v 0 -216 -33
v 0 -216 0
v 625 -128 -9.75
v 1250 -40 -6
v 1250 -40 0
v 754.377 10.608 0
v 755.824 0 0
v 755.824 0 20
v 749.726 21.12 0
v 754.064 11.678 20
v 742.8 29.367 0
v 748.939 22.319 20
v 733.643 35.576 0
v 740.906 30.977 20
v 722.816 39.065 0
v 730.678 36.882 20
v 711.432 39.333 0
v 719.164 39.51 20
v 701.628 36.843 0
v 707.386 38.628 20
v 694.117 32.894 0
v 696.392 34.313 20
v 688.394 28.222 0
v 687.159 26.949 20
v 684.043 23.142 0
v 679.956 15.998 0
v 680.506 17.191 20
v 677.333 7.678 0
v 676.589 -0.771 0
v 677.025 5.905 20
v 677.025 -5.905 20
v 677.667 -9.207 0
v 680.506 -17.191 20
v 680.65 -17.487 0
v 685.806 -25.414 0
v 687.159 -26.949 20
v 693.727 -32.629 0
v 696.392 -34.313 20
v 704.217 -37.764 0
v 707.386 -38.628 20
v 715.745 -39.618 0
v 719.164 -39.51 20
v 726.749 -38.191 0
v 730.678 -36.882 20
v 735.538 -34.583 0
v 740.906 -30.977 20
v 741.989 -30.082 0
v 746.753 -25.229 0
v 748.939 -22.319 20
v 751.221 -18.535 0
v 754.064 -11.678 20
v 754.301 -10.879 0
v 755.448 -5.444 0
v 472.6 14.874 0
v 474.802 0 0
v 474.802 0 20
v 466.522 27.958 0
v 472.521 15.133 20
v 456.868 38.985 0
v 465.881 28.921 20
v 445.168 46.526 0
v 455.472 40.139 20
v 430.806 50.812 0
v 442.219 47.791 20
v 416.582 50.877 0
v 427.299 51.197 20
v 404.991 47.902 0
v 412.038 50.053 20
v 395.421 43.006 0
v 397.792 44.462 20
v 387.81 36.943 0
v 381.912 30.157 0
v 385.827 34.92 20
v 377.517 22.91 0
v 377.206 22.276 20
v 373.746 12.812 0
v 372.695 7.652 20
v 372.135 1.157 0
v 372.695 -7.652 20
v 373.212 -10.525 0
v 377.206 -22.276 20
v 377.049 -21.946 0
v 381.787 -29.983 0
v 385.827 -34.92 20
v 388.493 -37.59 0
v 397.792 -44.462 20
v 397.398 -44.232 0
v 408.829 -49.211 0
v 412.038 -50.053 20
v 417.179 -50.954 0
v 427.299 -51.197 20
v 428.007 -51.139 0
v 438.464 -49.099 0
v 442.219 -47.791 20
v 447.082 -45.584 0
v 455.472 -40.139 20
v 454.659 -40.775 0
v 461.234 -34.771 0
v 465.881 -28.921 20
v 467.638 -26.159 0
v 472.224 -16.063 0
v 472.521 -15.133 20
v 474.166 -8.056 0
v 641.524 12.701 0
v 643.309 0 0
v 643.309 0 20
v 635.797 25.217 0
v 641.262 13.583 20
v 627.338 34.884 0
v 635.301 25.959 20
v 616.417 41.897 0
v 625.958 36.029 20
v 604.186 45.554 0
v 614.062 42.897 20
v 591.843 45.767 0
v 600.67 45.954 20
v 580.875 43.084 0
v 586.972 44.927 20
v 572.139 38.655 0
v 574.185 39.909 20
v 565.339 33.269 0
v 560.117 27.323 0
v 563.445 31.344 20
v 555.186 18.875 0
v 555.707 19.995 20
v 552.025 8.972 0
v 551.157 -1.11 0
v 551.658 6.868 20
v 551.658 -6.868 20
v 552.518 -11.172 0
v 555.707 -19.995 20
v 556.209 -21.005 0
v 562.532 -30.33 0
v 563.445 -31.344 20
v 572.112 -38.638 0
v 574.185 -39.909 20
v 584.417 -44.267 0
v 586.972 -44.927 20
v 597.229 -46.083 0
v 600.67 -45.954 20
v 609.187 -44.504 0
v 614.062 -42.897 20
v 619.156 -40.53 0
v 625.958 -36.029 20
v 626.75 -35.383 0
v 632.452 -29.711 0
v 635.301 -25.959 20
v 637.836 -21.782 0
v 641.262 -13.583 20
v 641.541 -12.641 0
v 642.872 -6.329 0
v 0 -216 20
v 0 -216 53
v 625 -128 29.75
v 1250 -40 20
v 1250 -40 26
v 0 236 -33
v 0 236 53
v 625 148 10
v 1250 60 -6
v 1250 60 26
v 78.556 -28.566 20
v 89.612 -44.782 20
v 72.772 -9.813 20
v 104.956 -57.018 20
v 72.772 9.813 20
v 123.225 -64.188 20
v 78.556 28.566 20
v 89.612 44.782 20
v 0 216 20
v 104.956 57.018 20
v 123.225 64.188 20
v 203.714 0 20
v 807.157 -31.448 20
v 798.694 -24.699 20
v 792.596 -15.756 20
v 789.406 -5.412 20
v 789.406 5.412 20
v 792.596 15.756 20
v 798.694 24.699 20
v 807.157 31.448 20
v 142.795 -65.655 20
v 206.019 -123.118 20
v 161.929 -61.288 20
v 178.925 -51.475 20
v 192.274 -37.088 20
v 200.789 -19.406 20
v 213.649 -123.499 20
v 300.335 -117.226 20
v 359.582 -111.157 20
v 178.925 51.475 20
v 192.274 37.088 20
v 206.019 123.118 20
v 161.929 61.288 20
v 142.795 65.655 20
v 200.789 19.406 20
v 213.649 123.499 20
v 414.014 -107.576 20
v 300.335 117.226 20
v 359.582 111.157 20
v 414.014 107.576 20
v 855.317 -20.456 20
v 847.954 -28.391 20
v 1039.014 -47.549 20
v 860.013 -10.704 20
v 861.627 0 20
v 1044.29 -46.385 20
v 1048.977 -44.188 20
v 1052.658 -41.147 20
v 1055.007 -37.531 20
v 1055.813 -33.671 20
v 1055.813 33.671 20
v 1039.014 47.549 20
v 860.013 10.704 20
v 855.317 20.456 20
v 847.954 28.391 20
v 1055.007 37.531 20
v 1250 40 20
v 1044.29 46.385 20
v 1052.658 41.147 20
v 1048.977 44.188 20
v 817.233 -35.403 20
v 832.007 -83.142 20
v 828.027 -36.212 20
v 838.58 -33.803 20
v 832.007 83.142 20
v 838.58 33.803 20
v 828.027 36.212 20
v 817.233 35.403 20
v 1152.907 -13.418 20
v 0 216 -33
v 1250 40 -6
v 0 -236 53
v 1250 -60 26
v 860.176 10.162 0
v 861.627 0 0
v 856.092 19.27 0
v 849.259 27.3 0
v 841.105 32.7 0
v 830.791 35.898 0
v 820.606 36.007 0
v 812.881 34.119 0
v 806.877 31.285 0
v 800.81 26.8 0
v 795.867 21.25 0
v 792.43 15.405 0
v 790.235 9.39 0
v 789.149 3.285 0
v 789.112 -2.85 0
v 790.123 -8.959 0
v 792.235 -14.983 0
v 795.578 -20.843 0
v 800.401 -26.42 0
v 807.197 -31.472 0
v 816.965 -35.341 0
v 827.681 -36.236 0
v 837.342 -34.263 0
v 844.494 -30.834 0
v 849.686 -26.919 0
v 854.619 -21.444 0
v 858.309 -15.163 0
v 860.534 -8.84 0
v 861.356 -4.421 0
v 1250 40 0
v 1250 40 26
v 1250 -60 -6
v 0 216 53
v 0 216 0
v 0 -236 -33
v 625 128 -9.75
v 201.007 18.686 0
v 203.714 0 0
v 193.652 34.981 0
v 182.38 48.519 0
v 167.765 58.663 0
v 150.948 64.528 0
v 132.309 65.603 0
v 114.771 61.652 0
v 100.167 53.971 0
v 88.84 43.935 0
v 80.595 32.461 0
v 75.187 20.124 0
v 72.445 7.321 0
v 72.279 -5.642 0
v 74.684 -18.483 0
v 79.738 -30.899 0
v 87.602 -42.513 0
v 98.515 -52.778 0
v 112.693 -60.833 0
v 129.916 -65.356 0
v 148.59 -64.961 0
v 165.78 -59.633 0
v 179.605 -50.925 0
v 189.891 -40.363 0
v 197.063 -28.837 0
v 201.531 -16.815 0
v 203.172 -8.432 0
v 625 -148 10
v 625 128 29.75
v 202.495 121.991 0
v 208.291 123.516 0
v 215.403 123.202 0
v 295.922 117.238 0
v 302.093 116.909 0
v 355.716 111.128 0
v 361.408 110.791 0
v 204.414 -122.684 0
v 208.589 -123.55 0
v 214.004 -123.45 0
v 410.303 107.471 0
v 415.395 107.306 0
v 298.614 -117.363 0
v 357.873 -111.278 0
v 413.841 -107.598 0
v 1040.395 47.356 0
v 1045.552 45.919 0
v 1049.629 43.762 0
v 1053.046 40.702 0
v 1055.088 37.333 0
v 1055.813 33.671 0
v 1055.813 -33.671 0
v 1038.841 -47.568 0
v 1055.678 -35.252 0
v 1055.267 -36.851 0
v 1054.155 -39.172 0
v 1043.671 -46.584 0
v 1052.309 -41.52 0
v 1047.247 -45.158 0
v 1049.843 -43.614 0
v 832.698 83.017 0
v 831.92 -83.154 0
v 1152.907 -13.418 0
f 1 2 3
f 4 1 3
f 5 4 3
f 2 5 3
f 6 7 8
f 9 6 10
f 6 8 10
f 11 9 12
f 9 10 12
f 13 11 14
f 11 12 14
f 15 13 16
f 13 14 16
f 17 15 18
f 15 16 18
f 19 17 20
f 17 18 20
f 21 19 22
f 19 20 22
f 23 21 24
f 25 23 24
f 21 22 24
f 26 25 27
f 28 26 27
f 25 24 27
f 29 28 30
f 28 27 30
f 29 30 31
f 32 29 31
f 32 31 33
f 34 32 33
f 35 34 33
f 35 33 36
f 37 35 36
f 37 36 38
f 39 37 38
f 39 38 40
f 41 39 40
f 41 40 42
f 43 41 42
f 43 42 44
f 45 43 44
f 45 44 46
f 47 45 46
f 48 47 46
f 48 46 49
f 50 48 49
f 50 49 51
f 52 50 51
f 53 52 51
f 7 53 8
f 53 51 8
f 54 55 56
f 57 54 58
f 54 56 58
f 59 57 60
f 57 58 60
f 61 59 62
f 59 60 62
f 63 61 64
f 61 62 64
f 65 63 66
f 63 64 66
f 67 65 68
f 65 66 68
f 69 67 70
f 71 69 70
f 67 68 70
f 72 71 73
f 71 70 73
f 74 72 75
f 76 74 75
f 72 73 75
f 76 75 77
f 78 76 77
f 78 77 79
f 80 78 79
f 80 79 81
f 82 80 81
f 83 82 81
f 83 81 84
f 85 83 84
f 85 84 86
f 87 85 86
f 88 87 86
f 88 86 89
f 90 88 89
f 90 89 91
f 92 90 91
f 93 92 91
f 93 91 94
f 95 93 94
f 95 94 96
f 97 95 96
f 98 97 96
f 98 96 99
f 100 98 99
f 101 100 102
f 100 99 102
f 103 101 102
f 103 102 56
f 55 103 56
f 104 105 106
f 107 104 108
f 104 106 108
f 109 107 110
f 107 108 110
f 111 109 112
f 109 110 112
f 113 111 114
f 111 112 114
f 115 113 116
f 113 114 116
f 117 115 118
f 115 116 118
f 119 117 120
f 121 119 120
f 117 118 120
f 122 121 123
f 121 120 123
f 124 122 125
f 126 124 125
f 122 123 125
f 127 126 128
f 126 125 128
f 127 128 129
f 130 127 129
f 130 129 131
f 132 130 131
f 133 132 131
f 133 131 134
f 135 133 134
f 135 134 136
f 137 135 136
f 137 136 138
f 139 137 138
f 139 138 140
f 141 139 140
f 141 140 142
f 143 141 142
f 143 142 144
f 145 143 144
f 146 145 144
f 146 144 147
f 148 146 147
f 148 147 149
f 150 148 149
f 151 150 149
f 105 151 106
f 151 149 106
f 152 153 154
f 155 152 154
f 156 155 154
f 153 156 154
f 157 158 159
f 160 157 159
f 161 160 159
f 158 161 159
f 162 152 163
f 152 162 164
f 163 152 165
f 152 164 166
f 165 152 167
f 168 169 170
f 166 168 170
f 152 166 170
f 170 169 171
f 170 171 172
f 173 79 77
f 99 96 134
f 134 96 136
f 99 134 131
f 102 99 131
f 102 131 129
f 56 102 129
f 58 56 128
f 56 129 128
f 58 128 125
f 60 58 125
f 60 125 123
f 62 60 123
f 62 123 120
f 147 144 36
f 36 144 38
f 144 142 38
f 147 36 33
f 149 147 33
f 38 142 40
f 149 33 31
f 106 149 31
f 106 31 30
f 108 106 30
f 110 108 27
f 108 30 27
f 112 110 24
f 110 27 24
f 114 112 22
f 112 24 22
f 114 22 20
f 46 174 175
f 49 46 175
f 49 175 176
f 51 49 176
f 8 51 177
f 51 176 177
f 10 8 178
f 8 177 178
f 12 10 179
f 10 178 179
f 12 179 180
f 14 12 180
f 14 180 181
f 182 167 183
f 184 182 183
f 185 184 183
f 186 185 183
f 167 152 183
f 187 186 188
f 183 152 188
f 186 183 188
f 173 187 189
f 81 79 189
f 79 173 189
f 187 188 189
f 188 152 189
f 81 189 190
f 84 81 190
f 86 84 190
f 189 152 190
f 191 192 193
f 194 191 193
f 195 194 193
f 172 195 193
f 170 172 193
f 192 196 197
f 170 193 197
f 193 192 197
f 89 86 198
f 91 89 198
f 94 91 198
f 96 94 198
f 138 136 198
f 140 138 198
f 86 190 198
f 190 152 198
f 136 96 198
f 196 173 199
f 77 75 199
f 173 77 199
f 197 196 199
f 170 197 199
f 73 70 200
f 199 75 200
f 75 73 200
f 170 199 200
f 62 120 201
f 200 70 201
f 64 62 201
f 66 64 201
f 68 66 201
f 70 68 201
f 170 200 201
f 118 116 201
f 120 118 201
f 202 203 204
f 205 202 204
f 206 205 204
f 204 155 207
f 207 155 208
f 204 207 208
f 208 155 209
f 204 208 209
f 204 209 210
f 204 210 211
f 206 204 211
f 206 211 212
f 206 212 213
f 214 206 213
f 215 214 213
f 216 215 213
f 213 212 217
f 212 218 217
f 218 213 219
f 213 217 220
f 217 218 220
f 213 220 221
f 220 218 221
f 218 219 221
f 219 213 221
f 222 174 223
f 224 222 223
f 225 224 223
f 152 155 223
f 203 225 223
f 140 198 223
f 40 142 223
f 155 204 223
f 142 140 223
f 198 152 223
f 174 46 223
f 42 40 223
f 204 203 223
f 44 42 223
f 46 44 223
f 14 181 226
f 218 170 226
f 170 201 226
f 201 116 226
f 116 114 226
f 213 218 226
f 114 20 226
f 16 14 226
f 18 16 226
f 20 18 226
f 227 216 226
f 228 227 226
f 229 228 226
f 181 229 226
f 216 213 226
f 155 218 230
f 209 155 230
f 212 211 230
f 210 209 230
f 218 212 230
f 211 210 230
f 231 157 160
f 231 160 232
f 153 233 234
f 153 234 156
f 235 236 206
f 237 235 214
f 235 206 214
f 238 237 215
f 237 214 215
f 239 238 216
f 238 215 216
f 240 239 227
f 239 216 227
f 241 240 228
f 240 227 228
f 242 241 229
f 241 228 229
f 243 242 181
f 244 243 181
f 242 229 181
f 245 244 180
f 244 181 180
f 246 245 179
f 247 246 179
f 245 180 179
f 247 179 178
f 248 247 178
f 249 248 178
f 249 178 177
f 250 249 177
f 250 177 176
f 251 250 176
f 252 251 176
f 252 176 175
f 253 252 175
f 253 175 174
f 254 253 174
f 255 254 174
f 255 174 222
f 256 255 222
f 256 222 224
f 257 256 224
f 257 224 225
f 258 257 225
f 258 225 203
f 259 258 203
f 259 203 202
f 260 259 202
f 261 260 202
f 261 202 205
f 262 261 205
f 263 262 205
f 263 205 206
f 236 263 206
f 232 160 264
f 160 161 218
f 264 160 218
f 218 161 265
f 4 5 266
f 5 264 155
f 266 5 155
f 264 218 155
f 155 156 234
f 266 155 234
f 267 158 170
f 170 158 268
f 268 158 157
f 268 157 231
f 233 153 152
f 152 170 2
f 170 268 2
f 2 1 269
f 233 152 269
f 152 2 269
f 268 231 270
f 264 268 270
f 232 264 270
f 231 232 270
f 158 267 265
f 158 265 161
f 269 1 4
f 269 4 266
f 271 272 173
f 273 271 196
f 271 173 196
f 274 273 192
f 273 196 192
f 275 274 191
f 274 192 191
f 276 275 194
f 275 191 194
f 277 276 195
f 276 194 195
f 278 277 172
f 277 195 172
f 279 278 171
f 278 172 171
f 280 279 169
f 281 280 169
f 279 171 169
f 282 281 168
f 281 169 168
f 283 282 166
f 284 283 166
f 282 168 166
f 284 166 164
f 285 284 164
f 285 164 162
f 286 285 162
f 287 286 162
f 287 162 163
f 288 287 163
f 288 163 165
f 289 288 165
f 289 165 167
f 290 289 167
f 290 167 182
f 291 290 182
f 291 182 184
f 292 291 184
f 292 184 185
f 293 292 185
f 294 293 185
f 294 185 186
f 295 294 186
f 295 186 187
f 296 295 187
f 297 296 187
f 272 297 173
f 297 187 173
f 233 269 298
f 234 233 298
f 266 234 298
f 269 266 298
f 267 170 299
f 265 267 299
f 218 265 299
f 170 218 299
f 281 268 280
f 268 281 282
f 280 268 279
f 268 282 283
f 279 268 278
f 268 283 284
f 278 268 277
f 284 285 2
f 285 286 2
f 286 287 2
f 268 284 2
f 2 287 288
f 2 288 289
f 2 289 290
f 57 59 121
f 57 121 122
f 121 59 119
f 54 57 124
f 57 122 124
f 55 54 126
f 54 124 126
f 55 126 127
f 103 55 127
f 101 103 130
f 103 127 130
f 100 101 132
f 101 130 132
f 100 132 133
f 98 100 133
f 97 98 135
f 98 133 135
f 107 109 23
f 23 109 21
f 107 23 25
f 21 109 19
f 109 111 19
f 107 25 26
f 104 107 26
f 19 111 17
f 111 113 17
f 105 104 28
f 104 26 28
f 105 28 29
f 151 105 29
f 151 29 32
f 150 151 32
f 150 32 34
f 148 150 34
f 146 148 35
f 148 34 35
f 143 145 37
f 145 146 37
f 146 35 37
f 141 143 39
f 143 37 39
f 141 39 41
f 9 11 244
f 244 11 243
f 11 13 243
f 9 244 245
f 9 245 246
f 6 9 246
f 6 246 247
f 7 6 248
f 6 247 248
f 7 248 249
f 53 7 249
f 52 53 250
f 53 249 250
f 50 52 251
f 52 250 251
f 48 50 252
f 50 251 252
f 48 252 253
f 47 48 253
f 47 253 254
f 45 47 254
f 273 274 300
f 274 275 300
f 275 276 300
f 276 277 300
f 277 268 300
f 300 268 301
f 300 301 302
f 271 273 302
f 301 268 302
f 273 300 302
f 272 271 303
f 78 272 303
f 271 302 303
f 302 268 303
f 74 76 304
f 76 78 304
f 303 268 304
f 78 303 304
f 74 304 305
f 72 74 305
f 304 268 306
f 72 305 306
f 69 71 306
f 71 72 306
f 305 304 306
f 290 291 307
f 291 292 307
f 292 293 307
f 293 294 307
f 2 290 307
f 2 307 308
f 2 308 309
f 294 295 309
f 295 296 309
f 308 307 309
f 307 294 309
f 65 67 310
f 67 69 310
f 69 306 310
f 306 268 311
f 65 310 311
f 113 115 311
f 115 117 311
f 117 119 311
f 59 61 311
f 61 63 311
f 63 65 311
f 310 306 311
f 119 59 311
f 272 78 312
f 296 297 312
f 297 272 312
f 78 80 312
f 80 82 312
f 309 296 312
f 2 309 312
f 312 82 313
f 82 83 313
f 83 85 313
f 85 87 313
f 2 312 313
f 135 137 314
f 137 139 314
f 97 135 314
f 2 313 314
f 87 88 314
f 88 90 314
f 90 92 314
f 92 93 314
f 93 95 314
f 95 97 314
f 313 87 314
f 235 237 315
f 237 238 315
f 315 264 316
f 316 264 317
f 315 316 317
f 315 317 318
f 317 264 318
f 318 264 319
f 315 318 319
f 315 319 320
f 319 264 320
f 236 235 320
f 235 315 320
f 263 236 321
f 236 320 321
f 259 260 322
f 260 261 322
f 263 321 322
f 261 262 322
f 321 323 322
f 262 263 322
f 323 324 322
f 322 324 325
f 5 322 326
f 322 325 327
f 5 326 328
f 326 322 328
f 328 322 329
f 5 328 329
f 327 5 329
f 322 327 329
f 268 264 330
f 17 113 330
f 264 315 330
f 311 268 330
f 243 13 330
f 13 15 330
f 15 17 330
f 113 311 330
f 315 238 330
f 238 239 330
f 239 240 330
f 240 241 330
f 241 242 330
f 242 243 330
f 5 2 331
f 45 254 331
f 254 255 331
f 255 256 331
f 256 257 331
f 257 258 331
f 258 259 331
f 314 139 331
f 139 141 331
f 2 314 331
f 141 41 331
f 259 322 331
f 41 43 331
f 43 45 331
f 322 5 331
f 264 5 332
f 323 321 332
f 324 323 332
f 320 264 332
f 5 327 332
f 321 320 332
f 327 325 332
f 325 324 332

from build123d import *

# Parameters (mm, degrees)
SKETCH5_R          = 65.838775907
SKETCH5_R_2        = 51.340137945
SKETCH5_R_3        = 46.082776278
SKETCH5_R_4        = 36.313221665
SKETCH5_R_5        = 39.620905692
CUT_EXTRUDE1_DEPTH = 54.0000001


with BuildPart() as part:
    # Sketch1 → Loft l4 section 0
    with BuildSketch(Plane(origin=(0, 0, 0), x_dir=(0, 0, -1), z_dir=(1, 0, 0))):
        Polygon((-53, 236), (33, 236), (33, 216), (0, 216), (0, -216), (33, -216), (33, -236), (-53, -236), (-53, -216), (-20, -216), (-20, 216), (-53, 216), align=None)
    # Sketch4 → Loft l4 section 1
    with BuildSketch(Plane(origin=(1250, 0, -1000), x_dir=(0, 0, 1), z_dir=(-1, 0, 0))):
        Polygon((994, 60), (1026, 60), (1026, 40), (1020, 40), (1020, -40), (1026, -40), (1026, -60), (994, -60), (994, -40), (1000, -40), (1000, 40), (994, 40), align=None)
    loft()

    # Sketch5 → Cut-Extrude1 (cut, through all)
    with BuildSketch(Plane.XY.offset(20)):
        with Locations((137.875176339, 0)):
            Circle(SKETCH5_R)
        with Locations((423.461863642, 0)):
            Circle(SKETCH5_R_2)
        with Locations((597.226106195, 0)):
            Circle(SKETCH5_R_3)
        with Locations((825.313339697, 0)):
            Circle(SKETCH5_R_4)
        with Locations((716.202882206, 0)):
            Circle(SKETCH5_R_5)
    extrude(amount=-CUT_EXTRUDE1_DEPTH, mode=Mode.SUBTRACT)


solid = part.part
